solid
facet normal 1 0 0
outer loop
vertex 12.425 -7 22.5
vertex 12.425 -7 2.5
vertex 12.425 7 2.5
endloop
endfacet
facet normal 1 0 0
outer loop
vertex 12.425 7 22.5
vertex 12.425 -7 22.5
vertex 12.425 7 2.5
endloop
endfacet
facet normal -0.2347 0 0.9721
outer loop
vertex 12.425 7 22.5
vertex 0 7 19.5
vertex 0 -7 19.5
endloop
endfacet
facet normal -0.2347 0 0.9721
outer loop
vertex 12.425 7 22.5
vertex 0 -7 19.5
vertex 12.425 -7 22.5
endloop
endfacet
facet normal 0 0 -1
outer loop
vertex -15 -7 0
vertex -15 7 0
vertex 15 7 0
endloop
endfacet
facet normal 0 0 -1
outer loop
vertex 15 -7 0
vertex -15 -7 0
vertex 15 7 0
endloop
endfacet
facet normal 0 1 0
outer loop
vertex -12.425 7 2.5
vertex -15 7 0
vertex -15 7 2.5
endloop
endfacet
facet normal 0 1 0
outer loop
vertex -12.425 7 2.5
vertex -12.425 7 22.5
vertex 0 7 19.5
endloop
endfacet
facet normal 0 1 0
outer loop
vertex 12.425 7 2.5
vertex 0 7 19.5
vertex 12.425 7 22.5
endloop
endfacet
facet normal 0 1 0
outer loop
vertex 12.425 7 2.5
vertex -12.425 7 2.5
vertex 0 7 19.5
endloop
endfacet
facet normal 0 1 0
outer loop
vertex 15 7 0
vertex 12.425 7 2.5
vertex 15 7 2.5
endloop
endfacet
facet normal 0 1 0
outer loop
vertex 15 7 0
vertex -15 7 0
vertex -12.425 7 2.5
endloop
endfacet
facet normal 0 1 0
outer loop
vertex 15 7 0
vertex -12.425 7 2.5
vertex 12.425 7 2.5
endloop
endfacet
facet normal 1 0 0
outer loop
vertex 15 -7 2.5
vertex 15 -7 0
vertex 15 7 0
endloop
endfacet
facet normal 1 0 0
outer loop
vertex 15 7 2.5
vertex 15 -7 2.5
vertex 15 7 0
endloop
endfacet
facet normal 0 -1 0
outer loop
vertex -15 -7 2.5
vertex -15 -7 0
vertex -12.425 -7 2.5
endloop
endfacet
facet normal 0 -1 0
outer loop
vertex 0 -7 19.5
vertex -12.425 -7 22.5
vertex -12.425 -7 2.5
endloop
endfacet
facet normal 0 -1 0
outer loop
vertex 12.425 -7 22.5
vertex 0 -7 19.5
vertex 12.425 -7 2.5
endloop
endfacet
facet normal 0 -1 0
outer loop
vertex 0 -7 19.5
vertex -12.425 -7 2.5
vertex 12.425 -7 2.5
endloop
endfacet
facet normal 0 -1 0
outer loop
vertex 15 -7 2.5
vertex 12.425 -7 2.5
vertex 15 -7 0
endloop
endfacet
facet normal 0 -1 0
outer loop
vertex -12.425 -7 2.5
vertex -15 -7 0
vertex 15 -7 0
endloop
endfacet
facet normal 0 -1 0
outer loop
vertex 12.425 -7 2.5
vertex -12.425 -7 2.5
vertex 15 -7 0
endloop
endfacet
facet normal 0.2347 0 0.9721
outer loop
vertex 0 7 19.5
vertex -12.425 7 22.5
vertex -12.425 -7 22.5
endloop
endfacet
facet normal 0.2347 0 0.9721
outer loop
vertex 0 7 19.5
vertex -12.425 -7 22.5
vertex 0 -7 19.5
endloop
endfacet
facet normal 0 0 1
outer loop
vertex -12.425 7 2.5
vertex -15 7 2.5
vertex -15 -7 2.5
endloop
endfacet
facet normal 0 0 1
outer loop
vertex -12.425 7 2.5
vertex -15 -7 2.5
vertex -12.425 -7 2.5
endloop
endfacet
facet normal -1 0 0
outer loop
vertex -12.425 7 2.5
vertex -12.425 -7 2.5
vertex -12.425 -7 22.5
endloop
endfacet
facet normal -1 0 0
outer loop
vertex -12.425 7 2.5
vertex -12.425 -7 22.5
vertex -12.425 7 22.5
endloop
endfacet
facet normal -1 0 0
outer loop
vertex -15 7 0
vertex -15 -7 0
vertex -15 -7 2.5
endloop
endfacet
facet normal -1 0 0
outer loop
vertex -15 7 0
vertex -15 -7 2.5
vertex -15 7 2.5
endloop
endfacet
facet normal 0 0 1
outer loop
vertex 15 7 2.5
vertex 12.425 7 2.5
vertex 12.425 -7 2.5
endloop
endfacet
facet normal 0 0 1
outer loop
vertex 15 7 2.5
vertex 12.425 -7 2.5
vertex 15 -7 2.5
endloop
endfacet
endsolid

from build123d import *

# Parameters (mm, degrees)
CROQUIS1_W              = 30
CROQUIS1_H              = 14
SALIENTE_EXTRUIR1_DEPTH = 2.5
CROQUIS2_W              = 24.85
CROQUIS2_H              = 14
SALIENTE_EXTRUIR2_DEPTH = 20
CORTAR_EXTRUIR1_DEPTH   = 20


with BuildPart() as part:
    # Croquis1 → Saliente-Extruir1 (new body)
    with BuildSketch(Plane.XY):
        Rectangle(CROQUIS1_W, CROQUIS1_H)
    extrude(amount=SALIENTE_EXTRUIR1_DEPTH)

    # Croquis2 → Saliente-Extruir2 (add)
    with BuildSketch(Plane.XY.offset(2.5)):
        Rectangle(CROQUIS2_W, CROQUIS2_H)
    extrude(amount=SALIENTE_EXTRUIR2_DEPTH)

    # Croquis4 → Cortar-Extruir1 (cut)
    with BuildSketch(Plane(origin=(0, 7, 0), x_dir=(1, 0, 0), z_dir=(0, 1, 0))):
        Polygon((-12.425, -22.5), (0, -19.5), (12.425, -22.5), align=None)
    extrude(amount=-CORTAR_EXTRUIR1_DEPTH, mode=Mode.SUBTRACT)


solid = part.part
